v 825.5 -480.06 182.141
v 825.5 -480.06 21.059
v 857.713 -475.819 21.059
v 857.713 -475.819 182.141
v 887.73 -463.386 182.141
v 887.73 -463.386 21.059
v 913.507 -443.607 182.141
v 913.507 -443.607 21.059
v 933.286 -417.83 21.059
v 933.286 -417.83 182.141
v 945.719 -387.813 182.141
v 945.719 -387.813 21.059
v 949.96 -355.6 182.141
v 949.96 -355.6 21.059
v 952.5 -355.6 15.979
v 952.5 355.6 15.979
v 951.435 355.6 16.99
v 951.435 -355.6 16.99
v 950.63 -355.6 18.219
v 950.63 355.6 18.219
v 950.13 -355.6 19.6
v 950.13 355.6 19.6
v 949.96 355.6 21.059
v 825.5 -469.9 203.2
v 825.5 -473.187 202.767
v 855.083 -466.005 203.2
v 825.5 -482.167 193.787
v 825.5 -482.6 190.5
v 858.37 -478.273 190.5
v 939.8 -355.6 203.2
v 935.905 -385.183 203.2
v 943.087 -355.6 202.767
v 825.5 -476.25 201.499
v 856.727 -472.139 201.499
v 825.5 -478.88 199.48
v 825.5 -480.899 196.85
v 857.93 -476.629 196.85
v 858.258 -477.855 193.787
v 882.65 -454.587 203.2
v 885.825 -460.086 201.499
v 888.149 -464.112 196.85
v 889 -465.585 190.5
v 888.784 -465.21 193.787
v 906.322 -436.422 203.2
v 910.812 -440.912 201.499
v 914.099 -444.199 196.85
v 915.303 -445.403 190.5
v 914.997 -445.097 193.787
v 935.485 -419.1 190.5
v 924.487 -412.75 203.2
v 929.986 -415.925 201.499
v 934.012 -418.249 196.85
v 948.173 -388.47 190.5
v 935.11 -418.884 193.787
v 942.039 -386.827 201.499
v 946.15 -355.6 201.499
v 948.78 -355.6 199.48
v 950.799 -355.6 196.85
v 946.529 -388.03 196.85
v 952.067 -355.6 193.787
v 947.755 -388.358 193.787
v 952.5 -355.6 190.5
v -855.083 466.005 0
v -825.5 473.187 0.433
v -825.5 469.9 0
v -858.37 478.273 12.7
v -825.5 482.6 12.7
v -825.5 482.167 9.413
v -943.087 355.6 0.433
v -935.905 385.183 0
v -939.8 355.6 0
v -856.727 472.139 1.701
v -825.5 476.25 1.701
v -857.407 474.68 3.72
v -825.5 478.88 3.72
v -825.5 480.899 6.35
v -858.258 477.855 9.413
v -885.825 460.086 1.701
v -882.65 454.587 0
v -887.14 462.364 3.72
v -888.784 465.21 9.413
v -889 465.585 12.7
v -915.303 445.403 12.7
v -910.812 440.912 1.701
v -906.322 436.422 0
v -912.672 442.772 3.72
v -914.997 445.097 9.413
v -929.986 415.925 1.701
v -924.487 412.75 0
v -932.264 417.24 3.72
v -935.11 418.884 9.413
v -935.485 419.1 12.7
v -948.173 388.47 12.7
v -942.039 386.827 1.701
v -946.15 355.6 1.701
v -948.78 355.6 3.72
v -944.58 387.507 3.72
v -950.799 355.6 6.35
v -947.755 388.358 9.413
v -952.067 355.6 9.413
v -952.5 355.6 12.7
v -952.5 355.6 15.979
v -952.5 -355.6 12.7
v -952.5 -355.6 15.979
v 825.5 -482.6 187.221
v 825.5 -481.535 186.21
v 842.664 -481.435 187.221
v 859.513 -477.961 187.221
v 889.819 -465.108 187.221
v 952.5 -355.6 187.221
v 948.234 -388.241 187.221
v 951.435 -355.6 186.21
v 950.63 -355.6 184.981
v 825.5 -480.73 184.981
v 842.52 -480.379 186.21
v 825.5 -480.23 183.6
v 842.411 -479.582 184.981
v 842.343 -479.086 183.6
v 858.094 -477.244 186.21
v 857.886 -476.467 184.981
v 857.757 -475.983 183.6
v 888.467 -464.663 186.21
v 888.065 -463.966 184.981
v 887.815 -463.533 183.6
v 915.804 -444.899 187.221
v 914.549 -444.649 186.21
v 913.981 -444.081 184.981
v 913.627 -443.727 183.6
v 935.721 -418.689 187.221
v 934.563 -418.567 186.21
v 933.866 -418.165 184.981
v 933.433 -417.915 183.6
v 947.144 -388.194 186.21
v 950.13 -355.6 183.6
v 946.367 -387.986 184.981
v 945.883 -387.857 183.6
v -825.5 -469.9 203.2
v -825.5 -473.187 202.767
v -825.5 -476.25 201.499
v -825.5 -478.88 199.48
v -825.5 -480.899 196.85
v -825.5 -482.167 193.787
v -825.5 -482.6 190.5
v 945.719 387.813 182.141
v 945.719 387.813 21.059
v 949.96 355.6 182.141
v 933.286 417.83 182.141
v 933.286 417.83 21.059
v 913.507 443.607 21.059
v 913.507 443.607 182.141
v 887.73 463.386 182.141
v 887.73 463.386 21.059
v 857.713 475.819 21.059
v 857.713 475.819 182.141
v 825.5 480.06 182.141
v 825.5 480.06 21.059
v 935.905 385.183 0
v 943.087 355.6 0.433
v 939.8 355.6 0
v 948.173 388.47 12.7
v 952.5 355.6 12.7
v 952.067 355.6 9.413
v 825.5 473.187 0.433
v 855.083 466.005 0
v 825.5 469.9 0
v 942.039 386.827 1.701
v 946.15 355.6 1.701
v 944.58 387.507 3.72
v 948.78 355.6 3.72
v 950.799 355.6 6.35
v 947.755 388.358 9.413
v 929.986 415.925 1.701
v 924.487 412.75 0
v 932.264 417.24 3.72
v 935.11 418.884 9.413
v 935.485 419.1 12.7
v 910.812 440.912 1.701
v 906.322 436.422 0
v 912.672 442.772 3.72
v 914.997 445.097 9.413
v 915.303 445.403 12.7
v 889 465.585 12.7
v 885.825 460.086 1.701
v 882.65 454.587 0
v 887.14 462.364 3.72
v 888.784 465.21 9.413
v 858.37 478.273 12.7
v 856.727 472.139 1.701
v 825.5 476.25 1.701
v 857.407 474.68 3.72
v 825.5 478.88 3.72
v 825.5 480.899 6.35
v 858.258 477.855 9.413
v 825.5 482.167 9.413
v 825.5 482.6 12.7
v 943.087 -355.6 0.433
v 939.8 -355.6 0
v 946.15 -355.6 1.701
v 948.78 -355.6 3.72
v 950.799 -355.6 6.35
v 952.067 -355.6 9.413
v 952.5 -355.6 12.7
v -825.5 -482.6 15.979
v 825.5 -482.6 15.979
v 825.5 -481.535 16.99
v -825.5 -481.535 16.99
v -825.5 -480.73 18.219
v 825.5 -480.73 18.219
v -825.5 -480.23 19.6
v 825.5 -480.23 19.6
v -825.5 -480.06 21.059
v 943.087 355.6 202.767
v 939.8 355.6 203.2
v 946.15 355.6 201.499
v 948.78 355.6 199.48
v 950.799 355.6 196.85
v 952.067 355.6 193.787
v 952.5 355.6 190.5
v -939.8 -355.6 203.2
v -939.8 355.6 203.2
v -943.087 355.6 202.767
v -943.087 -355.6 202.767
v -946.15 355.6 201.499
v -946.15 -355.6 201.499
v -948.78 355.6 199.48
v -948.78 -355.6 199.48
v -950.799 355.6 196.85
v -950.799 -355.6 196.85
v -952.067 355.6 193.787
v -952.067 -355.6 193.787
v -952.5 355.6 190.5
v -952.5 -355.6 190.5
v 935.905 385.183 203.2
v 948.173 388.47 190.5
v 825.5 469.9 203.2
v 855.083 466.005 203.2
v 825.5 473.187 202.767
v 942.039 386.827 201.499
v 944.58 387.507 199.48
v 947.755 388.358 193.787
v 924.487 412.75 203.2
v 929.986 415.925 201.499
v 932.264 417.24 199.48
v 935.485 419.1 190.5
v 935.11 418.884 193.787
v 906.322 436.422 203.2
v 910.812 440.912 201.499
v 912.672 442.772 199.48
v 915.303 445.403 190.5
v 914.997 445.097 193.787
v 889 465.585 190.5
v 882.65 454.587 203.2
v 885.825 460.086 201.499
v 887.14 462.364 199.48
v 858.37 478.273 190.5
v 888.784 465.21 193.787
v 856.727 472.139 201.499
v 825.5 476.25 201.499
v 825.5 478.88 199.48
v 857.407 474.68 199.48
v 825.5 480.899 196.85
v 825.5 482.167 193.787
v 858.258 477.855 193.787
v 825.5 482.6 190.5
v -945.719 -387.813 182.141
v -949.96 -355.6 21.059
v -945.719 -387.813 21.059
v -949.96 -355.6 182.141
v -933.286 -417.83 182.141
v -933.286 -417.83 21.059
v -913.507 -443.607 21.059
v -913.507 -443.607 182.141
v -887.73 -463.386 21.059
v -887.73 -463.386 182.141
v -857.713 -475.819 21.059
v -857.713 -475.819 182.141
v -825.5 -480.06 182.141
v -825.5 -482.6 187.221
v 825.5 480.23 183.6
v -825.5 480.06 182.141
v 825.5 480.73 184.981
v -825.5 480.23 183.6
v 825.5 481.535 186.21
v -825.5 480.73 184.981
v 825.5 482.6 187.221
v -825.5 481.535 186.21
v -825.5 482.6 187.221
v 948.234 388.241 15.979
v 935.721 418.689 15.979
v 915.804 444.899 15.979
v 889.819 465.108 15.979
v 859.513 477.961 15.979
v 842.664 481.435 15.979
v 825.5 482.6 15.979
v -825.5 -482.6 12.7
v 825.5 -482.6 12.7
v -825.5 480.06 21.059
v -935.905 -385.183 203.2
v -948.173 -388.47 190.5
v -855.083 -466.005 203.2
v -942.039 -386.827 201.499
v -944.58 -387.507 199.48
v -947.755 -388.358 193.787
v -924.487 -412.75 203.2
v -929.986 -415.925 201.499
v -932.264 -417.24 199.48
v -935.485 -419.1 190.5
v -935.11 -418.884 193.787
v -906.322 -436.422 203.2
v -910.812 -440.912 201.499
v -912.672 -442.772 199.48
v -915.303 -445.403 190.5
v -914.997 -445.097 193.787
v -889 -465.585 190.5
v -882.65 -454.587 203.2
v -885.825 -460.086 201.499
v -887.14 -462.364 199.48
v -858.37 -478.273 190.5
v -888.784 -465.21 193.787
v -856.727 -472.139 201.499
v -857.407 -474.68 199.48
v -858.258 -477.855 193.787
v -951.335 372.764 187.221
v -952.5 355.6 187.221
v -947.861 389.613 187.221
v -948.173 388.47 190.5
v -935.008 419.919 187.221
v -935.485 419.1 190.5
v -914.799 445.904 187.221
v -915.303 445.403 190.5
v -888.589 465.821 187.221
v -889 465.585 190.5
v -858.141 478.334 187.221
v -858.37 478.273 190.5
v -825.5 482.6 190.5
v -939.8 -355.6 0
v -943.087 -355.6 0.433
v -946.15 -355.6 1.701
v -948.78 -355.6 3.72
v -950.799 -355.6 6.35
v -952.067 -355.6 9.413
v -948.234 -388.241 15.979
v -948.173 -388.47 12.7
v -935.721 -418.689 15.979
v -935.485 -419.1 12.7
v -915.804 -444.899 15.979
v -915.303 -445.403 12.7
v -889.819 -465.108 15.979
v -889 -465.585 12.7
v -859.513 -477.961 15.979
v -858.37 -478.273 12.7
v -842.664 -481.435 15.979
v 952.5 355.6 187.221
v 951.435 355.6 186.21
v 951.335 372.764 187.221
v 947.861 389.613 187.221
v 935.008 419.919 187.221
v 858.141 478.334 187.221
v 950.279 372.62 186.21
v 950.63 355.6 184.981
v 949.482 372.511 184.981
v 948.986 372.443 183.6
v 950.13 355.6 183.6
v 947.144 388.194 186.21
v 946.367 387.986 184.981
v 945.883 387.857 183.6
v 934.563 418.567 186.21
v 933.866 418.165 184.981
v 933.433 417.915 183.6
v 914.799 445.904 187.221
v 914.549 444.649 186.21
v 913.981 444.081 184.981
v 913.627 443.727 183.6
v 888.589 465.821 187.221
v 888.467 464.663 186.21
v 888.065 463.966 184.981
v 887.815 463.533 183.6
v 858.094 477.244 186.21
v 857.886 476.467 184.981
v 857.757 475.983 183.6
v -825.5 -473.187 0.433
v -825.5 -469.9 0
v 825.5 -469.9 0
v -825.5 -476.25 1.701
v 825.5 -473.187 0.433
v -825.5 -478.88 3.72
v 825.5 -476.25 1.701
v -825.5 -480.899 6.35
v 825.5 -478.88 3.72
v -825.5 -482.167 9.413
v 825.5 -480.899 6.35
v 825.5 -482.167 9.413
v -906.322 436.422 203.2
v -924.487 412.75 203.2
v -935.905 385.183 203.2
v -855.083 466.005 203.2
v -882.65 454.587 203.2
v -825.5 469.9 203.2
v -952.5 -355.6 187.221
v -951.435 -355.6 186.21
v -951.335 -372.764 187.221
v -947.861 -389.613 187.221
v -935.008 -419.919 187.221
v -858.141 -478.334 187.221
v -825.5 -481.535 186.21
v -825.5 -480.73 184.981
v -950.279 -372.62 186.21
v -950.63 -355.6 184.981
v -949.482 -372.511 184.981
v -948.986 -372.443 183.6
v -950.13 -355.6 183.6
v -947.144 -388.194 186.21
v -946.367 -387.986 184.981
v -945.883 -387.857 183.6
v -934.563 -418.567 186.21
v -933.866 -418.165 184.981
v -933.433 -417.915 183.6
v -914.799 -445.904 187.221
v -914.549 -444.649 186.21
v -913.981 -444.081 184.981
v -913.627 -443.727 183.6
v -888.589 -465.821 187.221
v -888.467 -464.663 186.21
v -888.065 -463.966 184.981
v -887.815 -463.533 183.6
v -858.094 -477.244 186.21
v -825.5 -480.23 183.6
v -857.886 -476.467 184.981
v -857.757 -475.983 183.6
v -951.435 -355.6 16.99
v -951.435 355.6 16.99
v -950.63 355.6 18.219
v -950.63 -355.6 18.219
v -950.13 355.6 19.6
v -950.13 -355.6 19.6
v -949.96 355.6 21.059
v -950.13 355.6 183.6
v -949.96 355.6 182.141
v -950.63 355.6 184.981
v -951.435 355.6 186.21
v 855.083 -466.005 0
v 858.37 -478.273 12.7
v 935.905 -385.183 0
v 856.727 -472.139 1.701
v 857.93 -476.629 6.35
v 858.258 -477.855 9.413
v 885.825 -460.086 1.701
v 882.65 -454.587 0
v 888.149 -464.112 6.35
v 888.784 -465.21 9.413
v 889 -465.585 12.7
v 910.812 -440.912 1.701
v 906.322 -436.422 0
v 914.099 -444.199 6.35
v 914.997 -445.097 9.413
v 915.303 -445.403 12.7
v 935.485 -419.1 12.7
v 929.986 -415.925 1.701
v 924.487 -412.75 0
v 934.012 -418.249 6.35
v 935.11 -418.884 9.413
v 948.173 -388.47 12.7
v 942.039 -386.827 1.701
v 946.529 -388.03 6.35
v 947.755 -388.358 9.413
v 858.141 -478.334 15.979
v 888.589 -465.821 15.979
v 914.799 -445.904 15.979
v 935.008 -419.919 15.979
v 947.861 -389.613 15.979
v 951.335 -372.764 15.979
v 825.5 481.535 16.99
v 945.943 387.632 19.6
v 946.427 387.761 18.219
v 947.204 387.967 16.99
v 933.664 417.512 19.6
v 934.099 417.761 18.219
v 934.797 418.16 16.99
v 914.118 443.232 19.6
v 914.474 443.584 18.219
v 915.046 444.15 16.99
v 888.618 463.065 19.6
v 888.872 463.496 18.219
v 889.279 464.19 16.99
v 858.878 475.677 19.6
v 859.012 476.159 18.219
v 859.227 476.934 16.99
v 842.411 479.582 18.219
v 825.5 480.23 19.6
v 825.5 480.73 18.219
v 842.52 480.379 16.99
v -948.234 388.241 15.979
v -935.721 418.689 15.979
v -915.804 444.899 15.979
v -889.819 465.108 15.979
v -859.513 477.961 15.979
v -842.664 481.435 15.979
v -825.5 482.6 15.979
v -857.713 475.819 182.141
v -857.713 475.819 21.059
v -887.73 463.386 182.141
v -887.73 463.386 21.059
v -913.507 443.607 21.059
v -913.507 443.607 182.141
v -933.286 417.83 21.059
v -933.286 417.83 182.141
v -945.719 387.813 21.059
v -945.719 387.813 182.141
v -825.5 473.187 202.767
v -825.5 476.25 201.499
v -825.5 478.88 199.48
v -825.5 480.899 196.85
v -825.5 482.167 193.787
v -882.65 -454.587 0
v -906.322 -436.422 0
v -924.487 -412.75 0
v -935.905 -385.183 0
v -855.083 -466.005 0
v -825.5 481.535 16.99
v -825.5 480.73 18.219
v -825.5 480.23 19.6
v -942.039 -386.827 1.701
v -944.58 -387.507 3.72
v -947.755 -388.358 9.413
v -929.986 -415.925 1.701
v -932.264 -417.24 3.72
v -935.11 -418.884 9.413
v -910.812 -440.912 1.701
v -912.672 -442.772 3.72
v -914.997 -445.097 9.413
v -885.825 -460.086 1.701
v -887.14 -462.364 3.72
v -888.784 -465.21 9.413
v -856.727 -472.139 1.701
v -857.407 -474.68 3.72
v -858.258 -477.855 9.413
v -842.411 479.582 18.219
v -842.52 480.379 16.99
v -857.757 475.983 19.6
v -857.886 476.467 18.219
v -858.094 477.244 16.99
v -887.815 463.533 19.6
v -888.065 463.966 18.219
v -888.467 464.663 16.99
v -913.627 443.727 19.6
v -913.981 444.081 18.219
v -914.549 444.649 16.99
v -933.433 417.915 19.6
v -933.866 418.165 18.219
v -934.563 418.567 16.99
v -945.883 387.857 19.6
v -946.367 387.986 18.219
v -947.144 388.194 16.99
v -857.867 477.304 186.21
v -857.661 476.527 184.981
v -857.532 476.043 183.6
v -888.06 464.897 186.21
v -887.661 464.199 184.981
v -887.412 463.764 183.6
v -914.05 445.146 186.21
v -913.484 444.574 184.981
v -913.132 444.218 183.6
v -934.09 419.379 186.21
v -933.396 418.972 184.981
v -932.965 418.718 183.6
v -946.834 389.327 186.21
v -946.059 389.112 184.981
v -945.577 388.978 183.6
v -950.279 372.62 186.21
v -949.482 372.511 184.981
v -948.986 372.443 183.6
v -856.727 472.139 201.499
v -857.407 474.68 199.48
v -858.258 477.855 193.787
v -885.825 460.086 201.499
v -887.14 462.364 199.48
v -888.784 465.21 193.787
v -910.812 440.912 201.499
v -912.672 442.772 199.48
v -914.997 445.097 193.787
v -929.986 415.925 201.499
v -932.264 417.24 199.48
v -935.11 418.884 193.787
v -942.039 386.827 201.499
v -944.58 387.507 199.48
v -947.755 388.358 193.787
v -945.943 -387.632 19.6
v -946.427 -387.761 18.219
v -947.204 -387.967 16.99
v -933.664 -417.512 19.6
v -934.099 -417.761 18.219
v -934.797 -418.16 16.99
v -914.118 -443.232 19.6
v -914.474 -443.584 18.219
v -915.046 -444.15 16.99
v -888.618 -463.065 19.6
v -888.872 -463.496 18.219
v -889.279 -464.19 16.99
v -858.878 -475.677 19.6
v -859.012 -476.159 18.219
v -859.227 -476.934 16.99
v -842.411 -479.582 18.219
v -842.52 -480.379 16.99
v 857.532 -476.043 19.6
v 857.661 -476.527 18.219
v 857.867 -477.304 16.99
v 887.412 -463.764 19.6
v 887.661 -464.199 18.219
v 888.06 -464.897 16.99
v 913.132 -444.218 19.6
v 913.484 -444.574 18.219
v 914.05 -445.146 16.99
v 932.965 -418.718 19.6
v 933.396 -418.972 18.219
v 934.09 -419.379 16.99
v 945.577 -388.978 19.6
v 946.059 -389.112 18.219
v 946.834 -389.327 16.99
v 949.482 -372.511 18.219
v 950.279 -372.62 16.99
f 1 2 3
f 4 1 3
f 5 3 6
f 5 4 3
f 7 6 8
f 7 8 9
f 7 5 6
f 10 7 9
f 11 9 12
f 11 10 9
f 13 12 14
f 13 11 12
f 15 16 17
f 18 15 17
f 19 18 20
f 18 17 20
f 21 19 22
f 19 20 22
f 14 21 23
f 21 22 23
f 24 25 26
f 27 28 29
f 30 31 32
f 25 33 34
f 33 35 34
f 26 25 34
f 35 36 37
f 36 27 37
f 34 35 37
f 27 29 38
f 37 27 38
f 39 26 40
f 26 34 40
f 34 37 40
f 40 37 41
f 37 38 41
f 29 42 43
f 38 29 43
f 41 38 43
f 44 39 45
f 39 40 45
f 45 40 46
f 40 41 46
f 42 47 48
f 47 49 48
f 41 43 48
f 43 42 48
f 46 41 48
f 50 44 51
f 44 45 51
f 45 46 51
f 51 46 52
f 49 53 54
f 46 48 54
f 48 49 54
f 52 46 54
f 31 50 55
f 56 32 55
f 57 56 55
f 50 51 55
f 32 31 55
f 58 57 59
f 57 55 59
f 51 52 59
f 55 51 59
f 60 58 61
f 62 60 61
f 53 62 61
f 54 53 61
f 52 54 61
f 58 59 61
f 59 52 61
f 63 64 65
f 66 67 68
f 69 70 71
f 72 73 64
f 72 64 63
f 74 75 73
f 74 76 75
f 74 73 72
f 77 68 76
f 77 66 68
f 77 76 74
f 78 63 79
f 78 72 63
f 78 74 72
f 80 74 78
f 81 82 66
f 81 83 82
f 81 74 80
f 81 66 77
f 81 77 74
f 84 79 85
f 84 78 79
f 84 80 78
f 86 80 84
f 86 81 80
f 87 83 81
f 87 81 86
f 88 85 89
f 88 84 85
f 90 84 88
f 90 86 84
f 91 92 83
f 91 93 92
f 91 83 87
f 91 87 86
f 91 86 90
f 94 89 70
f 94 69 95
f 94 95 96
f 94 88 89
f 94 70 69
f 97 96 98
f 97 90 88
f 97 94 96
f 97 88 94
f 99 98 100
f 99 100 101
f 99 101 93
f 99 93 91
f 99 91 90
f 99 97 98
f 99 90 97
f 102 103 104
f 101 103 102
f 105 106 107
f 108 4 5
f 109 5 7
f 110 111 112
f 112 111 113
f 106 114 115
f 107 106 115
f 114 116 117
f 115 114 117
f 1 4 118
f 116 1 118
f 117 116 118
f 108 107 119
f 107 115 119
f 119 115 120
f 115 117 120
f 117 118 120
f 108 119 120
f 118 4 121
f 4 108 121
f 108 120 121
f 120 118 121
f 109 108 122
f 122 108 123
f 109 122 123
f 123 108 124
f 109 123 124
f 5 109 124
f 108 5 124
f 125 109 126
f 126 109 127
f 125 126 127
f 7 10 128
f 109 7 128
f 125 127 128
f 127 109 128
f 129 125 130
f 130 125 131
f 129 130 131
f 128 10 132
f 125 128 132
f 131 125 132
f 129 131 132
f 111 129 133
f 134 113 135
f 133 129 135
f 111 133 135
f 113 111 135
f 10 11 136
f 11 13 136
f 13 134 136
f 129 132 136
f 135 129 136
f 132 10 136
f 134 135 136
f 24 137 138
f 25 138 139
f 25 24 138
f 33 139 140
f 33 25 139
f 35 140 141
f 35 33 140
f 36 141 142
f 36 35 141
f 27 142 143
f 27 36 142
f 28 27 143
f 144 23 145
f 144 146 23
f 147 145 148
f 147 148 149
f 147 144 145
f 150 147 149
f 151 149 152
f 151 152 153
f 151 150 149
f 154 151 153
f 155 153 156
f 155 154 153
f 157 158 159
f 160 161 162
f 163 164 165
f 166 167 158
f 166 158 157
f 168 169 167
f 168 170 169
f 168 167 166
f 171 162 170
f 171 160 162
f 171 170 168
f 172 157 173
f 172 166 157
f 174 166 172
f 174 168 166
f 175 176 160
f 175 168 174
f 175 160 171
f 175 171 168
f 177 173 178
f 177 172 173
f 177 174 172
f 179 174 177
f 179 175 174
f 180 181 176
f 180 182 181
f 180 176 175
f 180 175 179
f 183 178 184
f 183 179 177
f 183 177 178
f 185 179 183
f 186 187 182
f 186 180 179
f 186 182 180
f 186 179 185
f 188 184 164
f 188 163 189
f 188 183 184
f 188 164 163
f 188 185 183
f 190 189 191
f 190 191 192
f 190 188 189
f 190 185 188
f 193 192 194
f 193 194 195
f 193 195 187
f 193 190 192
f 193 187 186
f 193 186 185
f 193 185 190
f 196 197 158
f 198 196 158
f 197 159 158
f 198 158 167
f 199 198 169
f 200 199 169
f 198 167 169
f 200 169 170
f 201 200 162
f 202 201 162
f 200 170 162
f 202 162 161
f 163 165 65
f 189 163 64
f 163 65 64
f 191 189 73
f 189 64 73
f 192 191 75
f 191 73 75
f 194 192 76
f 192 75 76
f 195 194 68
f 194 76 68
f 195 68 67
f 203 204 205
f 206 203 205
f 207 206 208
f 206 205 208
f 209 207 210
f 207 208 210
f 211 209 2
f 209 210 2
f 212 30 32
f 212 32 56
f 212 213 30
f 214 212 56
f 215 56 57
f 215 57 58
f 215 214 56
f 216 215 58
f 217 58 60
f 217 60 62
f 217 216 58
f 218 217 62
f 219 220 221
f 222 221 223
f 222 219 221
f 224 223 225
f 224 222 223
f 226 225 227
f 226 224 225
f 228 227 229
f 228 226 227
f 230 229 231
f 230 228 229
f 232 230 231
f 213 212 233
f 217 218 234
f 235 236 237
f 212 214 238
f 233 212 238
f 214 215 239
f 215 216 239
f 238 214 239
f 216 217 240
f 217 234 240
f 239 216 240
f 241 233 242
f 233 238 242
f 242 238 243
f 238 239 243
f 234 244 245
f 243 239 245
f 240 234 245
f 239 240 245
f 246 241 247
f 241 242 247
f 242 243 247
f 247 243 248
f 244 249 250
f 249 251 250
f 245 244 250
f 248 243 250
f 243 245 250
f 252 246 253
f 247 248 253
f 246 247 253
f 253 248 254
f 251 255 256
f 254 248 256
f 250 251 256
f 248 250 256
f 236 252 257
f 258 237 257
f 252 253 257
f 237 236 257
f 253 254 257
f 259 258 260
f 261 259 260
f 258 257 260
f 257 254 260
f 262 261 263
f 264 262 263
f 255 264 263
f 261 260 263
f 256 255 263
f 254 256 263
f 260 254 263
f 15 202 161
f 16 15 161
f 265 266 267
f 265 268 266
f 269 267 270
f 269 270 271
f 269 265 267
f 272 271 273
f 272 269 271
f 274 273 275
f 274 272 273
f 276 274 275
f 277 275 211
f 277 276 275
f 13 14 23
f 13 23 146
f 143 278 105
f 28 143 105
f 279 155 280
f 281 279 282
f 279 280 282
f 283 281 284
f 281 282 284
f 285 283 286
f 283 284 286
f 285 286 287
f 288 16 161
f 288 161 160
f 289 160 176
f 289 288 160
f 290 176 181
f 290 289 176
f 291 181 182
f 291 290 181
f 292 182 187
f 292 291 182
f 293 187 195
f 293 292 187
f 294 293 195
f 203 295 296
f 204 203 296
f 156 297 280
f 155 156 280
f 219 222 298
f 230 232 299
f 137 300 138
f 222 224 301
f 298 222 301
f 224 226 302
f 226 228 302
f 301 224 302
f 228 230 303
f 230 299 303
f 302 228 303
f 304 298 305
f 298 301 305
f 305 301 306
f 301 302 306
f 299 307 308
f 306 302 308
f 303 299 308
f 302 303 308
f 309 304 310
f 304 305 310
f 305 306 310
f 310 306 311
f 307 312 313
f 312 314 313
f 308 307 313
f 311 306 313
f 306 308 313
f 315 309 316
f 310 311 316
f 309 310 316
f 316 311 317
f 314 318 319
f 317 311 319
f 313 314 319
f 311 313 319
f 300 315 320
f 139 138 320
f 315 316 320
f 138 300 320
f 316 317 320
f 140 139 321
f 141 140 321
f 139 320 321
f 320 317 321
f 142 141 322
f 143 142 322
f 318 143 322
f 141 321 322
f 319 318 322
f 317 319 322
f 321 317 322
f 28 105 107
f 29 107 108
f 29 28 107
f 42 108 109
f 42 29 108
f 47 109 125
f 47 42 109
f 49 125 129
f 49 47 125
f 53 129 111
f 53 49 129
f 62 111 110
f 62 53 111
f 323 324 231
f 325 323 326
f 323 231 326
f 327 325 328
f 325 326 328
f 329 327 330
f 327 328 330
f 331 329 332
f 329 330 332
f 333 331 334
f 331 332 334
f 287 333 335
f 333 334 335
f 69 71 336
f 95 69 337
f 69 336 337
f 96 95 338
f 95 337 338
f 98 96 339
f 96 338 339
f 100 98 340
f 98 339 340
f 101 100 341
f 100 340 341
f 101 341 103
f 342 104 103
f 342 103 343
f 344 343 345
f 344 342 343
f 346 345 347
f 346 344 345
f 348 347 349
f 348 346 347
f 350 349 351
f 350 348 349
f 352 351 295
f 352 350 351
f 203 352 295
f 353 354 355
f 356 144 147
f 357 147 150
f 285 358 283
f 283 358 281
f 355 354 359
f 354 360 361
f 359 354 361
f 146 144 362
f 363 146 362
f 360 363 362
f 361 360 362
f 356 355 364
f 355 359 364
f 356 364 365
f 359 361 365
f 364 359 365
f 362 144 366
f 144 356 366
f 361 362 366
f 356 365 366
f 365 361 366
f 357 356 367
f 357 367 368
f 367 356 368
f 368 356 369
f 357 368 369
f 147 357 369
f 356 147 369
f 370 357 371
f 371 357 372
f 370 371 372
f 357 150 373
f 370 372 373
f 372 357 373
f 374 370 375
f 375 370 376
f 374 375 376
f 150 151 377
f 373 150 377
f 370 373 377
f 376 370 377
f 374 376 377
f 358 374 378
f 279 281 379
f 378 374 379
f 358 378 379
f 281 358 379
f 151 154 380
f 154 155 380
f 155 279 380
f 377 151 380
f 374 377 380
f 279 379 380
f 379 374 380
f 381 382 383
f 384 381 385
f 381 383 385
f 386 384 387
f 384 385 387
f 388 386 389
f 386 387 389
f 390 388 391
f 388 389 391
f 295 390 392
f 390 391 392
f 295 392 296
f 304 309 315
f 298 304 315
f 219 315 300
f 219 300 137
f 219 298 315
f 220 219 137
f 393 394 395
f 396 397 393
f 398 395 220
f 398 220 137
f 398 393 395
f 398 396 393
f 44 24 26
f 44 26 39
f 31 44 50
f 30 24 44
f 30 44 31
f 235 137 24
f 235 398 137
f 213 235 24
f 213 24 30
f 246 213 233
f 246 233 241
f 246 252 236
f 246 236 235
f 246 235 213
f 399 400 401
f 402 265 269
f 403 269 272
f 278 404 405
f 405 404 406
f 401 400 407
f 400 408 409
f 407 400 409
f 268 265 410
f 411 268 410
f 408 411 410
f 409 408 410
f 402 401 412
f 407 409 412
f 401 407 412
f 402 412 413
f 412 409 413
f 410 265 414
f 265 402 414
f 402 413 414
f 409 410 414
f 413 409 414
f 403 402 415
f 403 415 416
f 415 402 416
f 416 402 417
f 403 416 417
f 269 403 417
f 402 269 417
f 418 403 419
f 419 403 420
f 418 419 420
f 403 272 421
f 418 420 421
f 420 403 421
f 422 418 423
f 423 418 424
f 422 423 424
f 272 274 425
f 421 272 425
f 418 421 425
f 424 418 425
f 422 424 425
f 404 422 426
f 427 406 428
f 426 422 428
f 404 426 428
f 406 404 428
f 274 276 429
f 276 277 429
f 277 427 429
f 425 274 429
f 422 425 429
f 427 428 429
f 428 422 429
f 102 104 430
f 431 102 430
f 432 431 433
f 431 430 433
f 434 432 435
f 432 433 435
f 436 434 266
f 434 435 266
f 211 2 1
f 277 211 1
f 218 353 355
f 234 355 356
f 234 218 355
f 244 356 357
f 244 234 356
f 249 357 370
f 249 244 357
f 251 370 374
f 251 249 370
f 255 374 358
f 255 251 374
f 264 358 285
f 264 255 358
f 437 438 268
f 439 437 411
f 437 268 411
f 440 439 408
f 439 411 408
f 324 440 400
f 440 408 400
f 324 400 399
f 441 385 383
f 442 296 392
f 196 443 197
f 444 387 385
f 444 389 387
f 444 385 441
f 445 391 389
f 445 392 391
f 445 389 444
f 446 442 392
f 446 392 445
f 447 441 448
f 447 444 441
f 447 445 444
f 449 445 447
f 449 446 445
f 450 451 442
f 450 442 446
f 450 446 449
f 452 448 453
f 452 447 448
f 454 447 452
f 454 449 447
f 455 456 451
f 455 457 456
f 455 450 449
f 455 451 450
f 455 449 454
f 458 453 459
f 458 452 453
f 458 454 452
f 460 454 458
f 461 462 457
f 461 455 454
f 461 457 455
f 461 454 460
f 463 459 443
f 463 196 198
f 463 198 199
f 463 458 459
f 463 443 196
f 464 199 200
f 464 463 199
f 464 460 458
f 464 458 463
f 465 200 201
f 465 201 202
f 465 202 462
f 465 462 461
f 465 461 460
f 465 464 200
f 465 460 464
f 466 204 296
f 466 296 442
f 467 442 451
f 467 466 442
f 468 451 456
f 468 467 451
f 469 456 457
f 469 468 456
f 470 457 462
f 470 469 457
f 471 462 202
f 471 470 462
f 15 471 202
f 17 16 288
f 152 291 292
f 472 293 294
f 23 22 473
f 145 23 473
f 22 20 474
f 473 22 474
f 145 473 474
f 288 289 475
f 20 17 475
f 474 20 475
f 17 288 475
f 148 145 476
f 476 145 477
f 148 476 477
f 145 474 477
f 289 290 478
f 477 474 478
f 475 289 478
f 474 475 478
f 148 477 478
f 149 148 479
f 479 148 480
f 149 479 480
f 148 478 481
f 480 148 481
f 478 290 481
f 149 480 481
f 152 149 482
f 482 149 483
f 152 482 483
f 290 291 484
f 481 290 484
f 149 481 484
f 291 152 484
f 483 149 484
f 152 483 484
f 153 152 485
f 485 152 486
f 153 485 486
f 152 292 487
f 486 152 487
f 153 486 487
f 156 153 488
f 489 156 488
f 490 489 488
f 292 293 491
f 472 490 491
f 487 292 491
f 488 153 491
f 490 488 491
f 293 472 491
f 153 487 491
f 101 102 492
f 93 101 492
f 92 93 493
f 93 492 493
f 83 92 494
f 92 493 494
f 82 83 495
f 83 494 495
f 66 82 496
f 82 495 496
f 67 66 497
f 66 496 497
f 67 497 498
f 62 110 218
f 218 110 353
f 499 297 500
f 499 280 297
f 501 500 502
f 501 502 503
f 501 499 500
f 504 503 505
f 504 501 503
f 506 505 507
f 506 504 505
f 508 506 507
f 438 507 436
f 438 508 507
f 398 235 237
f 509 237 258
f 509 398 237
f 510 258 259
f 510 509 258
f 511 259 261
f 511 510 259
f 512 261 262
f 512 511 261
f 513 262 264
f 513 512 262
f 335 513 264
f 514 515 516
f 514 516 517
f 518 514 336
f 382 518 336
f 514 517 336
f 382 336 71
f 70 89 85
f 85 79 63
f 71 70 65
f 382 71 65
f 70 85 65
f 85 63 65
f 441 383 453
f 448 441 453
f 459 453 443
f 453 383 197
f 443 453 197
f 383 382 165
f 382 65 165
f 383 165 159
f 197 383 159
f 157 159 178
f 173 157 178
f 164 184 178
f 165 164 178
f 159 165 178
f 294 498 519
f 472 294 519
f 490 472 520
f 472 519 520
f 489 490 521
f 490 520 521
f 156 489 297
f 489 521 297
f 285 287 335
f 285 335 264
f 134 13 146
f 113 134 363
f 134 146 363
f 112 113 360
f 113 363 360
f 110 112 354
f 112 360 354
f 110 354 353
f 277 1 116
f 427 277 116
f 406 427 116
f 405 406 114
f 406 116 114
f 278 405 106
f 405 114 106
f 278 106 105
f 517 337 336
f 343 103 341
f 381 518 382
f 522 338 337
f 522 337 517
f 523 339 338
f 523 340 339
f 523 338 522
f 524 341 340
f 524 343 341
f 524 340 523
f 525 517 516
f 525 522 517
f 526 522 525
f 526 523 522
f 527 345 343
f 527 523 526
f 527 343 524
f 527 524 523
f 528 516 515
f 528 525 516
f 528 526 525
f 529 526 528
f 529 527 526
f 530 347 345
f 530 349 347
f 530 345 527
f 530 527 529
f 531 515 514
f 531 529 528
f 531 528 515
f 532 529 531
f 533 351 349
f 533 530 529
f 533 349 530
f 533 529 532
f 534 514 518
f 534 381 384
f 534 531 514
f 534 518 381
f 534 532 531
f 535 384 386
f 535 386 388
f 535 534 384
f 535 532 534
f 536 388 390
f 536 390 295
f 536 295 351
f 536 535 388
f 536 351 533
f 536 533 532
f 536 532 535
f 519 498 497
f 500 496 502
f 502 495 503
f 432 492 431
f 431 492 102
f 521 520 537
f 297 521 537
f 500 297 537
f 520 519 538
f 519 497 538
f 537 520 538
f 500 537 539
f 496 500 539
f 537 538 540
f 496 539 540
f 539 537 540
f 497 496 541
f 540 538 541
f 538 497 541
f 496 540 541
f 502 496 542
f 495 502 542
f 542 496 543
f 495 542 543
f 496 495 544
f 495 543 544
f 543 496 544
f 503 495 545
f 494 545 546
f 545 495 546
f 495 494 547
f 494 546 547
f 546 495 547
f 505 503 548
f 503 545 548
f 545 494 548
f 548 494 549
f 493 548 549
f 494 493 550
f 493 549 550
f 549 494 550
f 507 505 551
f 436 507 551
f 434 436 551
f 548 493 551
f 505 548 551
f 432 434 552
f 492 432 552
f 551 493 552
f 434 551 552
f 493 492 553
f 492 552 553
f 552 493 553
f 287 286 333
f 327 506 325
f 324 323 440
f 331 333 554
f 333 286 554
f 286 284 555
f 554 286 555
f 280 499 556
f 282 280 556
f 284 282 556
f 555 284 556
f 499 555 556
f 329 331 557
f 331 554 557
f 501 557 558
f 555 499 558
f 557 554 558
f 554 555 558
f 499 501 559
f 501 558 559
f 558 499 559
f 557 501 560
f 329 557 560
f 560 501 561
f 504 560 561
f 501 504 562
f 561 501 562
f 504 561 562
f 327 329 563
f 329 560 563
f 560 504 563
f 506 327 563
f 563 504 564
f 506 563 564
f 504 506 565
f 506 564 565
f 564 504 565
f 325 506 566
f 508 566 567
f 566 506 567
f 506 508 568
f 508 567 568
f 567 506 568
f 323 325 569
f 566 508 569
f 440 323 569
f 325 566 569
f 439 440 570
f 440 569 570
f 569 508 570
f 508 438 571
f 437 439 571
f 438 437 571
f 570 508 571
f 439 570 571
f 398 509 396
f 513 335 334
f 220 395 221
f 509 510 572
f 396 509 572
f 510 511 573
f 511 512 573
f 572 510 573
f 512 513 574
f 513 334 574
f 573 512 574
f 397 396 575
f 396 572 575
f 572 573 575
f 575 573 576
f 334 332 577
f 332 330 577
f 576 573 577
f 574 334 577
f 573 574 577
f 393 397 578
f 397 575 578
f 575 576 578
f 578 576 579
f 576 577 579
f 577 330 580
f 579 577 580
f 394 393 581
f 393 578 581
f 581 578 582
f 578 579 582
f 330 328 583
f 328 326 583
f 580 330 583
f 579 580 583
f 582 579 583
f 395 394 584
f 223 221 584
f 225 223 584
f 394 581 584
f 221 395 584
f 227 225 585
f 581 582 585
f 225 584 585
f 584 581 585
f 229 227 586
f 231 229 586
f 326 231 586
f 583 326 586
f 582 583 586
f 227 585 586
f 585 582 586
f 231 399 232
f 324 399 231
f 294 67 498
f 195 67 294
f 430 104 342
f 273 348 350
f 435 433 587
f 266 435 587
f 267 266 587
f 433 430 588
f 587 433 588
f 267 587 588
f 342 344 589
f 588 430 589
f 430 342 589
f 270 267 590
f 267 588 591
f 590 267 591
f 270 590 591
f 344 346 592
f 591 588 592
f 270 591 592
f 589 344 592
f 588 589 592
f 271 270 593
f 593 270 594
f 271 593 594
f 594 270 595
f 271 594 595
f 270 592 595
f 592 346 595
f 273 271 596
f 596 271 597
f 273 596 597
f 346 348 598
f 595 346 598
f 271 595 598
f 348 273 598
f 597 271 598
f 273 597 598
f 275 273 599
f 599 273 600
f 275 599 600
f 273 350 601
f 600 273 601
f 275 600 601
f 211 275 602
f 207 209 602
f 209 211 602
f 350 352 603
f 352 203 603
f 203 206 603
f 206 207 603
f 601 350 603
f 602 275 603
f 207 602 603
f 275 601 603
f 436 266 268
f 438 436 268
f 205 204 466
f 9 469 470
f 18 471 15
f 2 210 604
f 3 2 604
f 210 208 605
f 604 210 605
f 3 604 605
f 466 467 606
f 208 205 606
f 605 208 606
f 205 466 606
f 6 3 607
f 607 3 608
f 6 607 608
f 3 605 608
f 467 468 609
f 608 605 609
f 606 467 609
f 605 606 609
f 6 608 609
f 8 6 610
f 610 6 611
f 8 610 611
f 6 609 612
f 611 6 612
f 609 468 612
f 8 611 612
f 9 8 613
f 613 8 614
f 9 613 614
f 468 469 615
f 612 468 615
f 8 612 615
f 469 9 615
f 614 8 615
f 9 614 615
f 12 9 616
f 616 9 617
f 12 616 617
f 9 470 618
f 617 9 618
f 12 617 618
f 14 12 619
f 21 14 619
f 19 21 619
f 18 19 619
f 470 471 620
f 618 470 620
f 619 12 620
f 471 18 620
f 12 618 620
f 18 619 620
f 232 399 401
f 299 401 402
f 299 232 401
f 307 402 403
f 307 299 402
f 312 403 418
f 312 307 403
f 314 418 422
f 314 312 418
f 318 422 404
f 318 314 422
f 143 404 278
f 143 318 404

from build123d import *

# Parameters (mm, degrees)
F0_W     = 1905
F0_H     = 965.2
F1_DEPTH = 203.2
F2_R     = 127
F3_R     = 12.7


with BuildPart() as f1:
    # F0 (on Top) → F1 (new body)
    with BuildSketch(Plane.XY):
        Rectangle(F0_W, F0_H)
    extrude(amount=F1_DEPTH)

    # F2
    f2_edges = [f1.edges().sort_by_distance(p)[0] for p in [
        (952.5, -482.6, 101.6),
        (-952.5, -482.6, 101.6),
        (952.5, 482.6, 101.6),
        (-952.5, 482.6, 101.6),
    ]]
    fillet(f2_edges, radius=F2_R)

    # F3
    f3_edges = [f1.edges().sort_by_distance(p)[0] for p in [
        (952.5, 0, 203.2),
        (915.302561, -445.402561, 203.2),
        (915.302561, 445.402561, 203.2),
        (0, -482.6, 203.2),
        (0, 482.6, 203.2),
        (-915.302561, -445.402561, 203.2),
        (-915.302561, 445.402561, 203.2),
        (-952.5, 0, 203.2),
        (952.5, 0, 0),
        (915.302561, -445.402561, 0),
        (915.302561, 445.402561, 0),
        (0, -482.6, 0),
        (0, 482.6, 0),
        (-915.302561, -445.402561, 0),
        (-915.302561, 445.402561, 0),
        (-952.5, 0, 0),
    ]]
    fillet(f3_edges, radius=F3_R)

    # F7: sweep along a path in F7_path
    with BuildLine(Plane(origin=(-825.5, -482.6, 190.5), x_dir=(0, 1, 0), z_dir=(0, 0, 1))) as f7_path:
        Line((0, 0), (0, -1651))
        ThreePointArc((0, -1651), (37.1974387893, -1740.8025612107), (127, -1778))
        Line((127, -1778), (838.2, -1778))
        ThreePointArc((838.2, -1778), (928.0025612107, -1740.8025612107), (965.2, -1651))
        Line((965.2, -1651), (965.2, 0))
        ThreePointArc((965.2, 0), (928.0025612107, 89.8025612107), (838.2, 127))
        Line((838.2, 127), (127, 127))
        ThreePointArc((127, 127), (37.1974387893, 89.8025612107), (0, 0))
    # F5 (on face) → F7 (sweep, cut)
    with BuildSketch(Plane.YZ.offset(825.5)):
        with BuildLine():
            Line((-480.06, 21.058702955), (-480.06, 182.141297045))
            ThreePointArc((-480.06, 182.141297045), (-481.7282889113, 186.4312948633), (-485.8565610336, 188.4671333779))
            Line((-485.8565610336, 188.4671333779), (-553.3473393859, 194.3718113762))
            Line((-553.3473393859, 194.3718113762), (-553.3473393859, 8.8281886238))
            Line((-553.3473393859, 8.8281886238), (-485.8565610336, 14.7328666221))
            ThreePointArc((-485.8565610336, 14.7328666221), (-481.7282889113, 16.7687051367), (-480.06, 21.058702955))
        make_face()
    sweep(path=f7_path.line, mode=Mode.SUBTRACT)


solid = f1.part
